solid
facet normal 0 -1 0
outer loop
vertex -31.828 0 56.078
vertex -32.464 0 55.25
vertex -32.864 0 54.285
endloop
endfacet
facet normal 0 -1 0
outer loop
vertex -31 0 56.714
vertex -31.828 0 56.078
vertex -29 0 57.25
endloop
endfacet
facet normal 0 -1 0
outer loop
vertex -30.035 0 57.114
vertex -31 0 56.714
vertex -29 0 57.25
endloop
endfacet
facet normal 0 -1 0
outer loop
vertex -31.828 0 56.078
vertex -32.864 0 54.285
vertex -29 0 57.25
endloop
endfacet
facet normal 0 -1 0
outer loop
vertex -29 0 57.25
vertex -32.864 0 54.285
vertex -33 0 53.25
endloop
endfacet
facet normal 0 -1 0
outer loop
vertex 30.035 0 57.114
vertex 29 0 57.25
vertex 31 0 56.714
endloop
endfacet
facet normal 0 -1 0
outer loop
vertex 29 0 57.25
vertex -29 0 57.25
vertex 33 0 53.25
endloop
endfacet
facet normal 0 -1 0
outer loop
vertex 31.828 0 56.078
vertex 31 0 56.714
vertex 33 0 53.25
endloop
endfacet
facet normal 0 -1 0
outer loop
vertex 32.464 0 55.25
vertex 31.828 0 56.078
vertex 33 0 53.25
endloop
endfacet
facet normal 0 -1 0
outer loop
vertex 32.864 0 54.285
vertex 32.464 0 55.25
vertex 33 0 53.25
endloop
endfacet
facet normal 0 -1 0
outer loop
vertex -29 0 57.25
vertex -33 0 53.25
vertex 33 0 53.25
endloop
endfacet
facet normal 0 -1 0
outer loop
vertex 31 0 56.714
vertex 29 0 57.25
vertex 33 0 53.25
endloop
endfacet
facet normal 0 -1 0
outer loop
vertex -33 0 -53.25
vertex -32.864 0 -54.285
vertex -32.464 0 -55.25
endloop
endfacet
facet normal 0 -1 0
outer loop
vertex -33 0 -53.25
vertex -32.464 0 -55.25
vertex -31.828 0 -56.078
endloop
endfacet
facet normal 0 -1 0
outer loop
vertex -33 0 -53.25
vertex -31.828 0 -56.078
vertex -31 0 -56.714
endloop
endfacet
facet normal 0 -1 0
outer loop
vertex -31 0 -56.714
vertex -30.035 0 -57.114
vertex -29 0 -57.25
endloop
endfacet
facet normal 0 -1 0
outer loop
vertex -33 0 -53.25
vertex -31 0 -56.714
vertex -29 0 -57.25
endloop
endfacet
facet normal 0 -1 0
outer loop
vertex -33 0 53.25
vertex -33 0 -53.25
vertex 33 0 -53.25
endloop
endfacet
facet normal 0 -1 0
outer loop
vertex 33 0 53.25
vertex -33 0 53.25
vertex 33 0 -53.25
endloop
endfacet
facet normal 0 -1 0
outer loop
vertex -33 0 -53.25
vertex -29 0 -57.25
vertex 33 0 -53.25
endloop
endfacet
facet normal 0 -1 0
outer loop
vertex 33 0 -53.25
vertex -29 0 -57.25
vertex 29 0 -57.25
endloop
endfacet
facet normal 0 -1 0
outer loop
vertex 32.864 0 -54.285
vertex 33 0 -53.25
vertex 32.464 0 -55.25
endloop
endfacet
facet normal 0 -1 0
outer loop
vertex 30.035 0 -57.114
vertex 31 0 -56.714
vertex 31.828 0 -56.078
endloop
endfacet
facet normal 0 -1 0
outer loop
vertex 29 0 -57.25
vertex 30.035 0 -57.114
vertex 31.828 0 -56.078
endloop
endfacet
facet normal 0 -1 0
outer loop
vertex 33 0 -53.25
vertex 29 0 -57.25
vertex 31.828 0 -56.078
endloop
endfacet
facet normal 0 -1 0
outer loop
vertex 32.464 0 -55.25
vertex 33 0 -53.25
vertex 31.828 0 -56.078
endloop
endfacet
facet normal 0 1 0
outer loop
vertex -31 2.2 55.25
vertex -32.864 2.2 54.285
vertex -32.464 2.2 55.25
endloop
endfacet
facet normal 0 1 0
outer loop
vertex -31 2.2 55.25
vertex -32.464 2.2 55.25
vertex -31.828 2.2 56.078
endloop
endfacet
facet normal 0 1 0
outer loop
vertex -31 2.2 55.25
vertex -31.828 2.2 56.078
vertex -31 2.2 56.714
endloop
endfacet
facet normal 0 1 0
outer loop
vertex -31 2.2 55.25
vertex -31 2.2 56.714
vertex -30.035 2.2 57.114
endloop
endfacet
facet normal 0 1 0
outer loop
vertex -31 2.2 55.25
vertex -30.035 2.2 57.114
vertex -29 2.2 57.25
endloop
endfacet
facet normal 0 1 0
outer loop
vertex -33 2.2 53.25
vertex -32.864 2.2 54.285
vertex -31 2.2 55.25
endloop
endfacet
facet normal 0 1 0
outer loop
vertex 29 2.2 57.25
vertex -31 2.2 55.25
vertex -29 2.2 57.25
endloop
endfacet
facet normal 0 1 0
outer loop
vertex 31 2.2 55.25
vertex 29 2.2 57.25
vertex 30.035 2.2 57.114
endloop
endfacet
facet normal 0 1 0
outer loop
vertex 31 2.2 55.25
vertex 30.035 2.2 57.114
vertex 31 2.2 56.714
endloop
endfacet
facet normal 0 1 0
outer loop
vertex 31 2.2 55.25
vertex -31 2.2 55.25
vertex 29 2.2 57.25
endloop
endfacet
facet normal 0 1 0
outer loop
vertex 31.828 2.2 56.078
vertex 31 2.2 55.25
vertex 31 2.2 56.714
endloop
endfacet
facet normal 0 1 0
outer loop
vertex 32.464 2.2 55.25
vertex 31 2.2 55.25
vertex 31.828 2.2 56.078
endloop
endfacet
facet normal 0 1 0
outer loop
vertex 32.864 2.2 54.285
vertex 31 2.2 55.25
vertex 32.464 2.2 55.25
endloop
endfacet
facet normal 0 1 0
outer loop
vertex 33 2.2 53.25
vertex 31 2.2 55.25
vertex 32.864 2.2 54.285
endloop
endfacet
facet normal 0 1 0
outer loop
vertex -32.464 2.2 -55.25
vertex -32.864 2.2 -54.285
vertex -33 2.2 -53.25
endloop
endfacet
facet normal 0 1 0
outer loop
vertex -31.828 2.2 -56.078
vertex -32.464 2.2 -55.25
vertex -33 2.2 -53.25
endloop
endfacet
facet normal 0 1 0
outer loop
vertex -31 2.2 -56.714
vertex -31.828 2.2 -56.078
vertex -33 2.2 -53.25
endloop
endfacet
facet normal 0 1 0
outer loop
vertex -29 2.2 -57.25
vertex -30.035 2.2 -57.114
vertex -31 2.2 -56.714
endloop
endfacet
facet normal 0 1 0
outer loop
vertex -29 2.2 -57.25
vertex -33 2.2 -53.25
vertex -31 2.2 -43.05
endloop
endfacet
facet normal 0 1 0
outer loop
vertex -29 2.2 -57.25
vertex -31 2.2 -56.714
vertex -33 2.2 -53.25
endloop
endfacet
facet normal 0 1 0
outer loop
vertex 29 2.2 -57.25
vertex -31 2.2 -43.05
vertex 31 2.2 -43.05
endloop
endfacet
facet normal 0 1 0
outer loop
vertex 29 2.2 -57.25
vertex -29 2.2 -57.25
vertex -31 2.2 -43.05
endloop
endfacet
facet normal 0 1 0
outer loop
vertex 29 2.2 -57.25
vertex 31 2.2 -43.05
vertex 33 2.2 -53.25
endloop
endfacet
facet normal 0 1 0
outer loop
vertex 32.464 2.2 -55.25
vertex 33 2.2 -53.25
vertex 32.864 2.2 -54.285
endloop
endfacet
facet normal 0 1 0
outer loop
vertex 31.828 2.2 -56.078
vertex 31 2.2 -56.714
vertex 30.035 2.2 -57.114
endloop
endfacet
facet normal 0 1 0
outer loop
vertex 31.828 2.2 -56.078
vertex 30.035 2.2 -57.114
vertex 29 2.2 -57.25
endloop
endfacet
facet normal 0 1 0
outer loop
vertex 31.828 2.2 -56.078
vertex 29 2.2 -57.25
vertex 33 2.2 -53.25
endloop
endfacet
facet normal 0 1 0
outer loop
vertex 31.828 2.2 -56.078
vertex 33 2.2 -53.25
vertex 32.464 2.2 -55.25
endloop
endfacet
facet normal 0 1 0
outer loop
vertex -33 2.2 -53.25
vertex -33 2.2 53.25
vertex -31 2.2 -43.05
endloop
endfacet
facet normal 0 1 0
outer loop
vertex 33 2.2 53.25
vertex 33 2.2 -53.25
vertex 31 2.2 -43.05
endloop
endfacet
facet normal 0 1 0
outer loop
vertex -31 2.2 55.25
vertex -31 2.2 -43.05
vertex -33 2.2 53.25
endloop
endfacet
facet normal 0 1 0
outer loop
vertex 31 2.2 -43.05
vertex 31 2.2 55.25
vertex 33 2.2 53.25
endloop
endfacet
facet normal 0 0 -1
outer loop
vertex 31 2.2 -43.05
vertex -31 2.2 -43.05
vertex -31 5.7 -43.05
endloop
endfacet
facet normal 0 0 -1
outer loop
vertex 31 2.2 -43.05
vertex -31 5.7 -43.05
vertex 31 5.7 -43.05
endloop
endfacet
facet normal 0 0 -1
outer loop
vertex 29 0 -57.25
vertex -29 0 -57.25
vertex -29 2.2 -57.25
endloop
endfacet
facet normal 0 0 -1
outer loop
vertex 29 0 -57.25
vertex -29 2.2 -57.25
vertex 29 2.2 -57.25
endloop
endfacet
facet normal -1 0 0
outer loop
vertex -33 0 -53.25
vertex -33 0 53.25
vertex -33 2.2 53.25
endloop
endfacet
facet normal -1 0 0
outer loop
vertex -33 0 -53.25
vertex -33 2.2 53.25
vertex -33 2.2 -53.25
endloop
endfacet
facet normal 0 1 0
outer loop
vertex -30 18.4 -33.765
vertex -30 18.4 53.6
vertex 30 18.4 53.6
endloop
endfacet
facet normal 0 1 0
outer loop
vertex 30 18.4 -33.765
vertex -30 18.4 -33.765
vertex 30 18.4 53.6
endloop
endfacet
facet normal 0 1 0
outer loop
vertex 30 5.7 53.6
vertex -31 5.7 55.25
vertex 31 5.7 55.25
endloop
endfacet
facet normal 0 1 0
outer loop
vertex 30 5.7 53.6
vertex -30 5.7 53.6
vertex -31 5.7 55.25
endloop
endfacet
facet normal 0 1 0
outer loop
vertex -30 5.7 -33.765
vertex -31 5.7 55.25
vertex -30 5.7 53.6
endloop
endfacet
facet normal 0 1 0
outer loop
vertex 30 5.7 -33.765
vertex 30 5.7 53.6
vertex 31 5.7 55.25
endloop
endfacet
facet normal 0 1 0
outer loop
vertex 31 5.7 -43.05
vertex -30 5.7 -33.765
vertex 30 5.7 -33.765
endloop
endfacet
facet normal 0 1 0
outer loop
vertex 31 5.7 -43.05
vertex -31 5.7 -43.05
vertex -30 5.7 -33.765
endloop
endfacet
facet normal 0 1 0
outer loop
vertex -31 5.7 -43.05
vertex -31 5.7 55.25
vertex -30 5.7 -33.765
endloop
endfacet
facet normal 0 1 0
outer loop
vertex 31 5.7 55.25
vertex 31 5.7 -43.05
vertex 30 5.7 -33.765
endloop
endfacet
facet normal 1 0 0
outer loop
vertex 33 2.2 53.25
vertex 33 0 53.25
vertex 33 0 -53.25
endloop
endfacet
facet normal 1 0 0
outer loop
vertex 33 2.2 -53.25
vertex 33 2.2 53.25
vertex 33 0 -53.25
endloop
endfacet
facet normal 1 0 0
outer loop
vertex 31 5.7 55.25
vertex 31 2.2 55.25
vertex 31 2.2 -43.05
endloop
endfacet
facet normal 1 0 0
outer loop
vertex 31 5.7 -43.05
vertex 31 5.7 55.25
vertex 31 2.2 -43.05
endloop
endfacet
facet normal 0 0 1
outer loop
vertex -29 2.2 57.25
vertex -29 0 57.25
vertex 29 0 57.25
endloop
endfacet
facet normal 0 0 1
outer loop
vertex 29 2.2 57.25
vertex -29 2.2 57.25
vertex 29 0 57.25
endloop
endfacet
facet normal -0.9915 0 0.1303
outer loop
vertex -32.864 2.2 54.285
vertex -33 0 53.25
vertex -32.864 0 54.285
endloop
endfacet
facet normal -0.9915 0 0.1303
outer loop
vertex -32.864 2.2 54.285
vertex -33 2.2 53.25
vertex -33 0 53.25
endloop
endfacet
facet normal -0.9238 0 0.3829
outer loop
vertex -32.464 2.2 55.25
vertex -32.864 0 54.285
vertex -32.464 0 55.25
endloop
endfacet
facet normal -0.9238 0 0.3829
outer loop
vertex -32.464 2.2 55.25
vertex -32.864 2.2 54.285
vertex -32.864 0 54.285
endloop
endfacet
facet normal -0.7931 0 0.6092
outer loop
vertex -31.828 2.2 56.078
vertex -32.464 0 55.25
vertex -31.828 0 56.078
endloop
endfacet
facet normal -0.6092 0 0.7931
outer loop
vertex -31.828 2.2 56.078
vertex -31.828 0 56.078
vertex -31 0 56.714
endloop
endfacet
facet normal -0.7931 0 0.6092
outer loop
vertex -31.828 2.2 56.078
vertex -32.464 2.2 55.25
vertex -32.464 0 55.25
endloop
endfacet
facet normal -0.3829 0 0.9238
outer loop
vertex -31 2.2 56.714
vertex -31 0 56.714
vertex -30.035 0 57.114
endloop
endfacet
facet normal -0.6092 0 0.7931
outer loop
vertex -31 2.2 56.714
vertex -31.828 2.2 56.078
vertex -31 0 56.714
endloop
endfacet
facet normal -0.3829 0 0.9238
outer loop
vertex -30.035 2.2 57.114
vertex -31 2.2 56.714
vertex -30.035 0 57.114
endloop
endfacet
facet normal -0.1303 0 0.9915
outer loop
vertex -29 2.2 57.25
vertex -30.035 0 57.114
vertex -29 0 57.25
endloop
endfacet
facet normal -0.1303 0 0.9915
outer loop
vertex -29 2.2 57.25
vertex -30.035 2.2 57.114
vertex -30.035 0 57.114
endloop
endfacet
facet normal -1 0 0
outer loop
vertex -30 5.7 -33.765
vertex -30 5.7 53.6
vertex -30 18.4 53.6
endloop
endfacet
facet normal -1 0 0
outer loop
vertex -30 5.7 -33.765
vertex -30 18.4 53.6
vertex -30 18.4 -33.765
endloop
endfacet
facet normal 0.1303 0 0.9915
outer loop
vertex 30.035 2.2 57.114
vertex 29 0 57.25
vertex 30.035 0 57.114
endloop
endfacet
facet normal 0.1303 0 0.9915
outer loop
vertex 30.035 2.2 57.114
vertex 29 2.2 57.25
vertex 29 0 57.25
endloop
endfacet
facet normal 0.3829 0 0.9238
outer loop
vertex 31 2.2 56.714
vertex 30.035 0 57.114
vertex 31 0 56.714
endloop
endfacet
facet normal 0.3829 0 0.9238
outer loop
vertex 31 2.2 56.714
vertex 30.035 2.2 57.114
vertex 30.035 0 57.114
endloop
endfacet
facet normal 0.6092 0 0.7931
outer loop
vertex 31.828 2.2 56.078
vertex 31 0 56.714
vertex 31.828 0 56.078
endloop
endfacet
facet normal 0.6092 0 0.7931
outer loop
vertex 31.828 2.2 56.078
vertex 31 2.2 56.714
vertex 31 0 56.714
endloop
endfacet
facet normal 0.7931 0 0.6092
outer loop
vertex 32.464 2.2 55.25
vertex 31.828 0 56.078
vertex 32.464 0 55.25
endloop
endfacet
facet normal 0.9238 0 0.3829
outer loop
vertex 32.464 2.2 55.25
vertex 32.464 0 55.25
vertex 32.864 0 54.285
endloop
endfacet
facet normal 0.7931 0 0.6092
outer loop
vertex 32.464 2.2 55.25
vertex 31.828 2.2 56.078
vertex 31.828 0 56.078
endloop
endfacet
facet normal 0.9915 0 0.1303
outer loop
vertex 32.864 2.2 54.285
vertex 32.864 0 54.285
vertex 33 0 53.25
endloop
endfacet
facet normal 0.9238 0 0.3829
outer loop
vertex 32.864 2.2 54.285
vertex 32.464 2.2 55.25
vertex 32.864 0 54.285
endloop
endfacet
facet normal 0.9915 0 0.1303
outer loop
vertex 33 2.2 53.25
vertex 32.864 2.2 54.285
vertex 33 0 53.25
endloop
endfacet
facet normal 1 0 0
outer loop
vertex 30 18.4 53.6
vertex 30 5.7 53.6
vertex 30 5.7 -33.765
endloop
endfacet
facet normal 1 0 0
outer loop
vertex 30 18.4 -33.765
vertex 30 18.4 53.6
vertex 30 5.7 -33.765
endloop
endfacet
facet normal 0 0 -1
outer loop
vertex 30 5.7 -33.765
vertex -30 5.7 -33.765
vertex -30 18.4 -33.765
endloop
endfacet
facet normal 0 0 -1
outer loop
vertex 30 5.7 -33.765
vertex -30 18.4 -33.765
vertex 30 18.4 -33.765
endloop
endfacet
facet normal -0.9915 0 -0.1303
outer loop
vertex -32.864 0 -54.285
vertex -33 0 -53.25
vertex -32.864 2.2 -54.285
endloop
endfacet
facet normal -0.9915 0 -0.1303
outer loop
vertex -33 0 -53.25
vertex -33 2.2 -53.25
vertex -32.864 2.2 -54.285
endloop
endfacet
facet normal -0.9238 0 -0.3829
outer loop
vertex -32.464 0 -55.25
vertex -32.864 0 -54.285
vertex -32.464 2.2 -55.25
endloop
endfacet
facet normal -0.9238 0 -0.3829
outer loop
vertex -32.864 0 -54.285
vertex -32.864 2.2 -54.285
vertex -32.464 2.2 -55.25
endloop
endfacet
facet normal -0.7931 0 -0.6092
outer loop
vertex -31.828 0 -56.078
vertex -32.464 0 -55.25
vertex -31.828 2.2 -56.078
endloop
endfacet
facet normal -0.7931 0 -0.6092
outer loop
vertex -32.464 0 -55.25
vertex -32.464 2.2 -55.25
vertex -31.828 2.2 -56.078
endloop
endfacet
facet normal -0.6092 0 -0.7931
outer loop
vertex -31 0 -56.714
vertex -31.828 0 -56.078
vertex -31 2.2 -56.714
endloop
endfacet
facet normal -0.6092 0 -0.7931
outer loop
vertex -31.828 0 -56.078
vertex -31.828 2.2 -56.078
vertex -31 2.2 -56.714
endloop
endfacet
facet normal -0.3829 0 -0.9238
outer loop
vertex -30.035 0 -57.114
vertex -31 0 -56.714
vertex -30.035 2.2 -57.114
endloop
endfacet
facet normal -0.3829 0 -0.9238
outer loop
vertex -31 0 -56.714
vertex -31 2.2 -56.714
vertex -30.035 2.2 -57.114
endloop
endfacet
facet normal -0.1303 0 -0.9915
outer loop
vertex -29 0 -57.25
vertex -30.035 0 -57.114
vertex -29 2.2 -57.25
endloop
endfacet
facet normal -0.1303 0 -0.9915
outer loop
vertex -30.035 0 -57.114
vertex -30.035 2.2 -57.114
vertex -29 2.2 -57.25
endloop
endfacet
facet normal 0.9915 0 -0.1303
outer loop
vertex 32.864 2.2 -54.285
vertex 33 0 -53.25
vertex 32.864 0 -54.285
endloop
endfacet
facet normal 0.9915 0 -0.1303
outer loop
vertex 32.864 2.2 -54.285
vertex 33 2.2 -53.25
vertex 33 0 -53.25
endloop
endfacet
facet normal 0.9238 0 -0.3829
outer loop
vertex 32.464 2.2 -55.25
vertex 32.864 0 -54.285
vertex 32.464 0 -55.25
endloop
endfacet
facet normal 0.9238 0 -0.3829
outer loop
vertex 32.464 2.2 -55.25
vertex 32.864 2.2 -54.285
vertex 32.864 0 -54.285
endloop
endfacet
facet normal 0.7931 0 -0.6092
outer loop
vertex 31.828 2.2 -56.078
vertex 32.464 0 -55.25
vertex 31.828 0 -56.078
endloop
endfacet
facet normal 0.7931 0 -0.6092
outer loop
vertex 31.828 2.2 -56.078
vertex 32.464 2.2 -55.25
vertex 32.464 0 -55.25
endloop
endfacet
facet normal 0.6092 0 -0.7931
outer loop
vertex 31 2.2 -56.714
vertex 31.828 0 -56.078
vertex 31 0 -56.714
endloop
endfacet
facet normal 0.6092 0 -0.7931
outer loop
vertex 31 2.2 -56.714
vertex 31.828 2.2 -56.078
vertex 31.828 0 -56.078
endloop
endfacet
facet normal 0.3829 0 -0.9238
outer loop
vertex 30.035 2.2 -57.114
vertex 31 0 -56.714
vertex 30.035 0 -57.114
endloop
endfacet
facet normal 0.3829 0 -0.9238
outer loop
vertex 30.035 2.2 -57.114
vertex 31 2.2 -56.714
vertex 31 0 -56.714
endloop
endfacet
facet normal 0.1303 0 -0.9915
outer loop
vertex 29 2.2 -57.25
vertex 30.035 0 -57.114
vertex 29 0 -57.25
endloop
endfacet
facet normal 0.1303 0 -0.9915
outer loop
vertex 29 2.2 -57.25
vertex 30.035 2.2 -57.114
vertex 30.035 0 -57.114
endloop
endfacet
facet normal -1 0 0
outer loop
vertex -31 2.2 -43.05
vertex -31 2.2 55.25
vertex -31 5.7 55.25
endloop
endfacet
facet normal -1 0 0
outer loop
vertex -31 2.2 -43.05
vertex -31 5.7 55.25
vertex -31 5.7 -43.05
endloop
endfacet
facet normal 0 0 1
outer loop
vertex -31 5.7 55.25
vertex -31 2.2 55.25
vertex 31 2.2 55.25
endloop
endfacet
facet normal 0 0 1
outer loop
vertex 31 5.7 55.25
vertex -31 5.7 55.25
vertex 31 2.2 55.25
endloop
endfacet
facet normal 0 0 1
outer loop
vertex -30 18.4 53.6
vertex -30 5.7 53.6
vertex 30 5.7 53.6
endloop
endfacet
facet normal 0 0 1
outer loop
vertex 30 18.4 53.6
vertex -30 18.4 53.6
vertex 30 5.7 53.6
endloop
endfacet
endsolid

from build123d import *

# Parameters (mm, degrees)
SKETCH_1_W      = 66
SKETCH_1_H      = 114.5
EXTRUDE_1_DEPTH = 2.2
FILLET_1_R      = 4
SKETCH_2_W      = 62
SKETCH_2_H      = 98.3
EXTRUDE_2_DEPTH = 3.5
SKETCH_3_W      = 60
SKETCH_3_H      = 87.364717042
EXTRUDE_3_DEPTH = 12.7


with BuildPart() as part:
    # 스케치1 → 보스-돌출1 (new body)
    with BuildSketch(Plane(origin=(0, 0, 0), x_dir=(1, 0, 0), z_dir=(0, 1, 0))):
        Rectangle(SKETCH_1_W, SKETCH_1_H)
    extrude(amount=EXTRUDE_1_DEPTH)

    # 필렛1
    fillet_1_edges = [part.edges().sort_by_distance(p)[0] for p in [
        (-33, 1.1, -57.25),
        (33, 1.1, -57.25),
        (33, 1.1, 57.25),
        (-33, 1.1, 57.25),
    ]]
    fillet(fillet_1_edges, radius=FILLET_1_R)

    # 스케치2 → 보스-돌출2 (add)
    with BuildSketch(Plane(origin=(0, 2.2, 0), x_dir=(1, 0, 0), z_dir=(0, 1, 0))):
        with Locations((0, -6.1)):
            Rectangle(SKETCH_2_W, SKETCH_2_H)
    extrude(amount=EXTRUDE_2_DEPTH)

    # 스케치3 → 보스-돌출3 (add)
    with BuildSketch(Plane(origin=(0, 5.7, 0), x_dir=(1, 0, 0), z_dir=(0, 1, 0))):
        with Locations((0, -9.917641479)):
            Rectangle(SKETCH_3_W, SKETCH_3_H)
    extrude(amount=EXTRUDE_3_DEPTH)


solid = part.part
